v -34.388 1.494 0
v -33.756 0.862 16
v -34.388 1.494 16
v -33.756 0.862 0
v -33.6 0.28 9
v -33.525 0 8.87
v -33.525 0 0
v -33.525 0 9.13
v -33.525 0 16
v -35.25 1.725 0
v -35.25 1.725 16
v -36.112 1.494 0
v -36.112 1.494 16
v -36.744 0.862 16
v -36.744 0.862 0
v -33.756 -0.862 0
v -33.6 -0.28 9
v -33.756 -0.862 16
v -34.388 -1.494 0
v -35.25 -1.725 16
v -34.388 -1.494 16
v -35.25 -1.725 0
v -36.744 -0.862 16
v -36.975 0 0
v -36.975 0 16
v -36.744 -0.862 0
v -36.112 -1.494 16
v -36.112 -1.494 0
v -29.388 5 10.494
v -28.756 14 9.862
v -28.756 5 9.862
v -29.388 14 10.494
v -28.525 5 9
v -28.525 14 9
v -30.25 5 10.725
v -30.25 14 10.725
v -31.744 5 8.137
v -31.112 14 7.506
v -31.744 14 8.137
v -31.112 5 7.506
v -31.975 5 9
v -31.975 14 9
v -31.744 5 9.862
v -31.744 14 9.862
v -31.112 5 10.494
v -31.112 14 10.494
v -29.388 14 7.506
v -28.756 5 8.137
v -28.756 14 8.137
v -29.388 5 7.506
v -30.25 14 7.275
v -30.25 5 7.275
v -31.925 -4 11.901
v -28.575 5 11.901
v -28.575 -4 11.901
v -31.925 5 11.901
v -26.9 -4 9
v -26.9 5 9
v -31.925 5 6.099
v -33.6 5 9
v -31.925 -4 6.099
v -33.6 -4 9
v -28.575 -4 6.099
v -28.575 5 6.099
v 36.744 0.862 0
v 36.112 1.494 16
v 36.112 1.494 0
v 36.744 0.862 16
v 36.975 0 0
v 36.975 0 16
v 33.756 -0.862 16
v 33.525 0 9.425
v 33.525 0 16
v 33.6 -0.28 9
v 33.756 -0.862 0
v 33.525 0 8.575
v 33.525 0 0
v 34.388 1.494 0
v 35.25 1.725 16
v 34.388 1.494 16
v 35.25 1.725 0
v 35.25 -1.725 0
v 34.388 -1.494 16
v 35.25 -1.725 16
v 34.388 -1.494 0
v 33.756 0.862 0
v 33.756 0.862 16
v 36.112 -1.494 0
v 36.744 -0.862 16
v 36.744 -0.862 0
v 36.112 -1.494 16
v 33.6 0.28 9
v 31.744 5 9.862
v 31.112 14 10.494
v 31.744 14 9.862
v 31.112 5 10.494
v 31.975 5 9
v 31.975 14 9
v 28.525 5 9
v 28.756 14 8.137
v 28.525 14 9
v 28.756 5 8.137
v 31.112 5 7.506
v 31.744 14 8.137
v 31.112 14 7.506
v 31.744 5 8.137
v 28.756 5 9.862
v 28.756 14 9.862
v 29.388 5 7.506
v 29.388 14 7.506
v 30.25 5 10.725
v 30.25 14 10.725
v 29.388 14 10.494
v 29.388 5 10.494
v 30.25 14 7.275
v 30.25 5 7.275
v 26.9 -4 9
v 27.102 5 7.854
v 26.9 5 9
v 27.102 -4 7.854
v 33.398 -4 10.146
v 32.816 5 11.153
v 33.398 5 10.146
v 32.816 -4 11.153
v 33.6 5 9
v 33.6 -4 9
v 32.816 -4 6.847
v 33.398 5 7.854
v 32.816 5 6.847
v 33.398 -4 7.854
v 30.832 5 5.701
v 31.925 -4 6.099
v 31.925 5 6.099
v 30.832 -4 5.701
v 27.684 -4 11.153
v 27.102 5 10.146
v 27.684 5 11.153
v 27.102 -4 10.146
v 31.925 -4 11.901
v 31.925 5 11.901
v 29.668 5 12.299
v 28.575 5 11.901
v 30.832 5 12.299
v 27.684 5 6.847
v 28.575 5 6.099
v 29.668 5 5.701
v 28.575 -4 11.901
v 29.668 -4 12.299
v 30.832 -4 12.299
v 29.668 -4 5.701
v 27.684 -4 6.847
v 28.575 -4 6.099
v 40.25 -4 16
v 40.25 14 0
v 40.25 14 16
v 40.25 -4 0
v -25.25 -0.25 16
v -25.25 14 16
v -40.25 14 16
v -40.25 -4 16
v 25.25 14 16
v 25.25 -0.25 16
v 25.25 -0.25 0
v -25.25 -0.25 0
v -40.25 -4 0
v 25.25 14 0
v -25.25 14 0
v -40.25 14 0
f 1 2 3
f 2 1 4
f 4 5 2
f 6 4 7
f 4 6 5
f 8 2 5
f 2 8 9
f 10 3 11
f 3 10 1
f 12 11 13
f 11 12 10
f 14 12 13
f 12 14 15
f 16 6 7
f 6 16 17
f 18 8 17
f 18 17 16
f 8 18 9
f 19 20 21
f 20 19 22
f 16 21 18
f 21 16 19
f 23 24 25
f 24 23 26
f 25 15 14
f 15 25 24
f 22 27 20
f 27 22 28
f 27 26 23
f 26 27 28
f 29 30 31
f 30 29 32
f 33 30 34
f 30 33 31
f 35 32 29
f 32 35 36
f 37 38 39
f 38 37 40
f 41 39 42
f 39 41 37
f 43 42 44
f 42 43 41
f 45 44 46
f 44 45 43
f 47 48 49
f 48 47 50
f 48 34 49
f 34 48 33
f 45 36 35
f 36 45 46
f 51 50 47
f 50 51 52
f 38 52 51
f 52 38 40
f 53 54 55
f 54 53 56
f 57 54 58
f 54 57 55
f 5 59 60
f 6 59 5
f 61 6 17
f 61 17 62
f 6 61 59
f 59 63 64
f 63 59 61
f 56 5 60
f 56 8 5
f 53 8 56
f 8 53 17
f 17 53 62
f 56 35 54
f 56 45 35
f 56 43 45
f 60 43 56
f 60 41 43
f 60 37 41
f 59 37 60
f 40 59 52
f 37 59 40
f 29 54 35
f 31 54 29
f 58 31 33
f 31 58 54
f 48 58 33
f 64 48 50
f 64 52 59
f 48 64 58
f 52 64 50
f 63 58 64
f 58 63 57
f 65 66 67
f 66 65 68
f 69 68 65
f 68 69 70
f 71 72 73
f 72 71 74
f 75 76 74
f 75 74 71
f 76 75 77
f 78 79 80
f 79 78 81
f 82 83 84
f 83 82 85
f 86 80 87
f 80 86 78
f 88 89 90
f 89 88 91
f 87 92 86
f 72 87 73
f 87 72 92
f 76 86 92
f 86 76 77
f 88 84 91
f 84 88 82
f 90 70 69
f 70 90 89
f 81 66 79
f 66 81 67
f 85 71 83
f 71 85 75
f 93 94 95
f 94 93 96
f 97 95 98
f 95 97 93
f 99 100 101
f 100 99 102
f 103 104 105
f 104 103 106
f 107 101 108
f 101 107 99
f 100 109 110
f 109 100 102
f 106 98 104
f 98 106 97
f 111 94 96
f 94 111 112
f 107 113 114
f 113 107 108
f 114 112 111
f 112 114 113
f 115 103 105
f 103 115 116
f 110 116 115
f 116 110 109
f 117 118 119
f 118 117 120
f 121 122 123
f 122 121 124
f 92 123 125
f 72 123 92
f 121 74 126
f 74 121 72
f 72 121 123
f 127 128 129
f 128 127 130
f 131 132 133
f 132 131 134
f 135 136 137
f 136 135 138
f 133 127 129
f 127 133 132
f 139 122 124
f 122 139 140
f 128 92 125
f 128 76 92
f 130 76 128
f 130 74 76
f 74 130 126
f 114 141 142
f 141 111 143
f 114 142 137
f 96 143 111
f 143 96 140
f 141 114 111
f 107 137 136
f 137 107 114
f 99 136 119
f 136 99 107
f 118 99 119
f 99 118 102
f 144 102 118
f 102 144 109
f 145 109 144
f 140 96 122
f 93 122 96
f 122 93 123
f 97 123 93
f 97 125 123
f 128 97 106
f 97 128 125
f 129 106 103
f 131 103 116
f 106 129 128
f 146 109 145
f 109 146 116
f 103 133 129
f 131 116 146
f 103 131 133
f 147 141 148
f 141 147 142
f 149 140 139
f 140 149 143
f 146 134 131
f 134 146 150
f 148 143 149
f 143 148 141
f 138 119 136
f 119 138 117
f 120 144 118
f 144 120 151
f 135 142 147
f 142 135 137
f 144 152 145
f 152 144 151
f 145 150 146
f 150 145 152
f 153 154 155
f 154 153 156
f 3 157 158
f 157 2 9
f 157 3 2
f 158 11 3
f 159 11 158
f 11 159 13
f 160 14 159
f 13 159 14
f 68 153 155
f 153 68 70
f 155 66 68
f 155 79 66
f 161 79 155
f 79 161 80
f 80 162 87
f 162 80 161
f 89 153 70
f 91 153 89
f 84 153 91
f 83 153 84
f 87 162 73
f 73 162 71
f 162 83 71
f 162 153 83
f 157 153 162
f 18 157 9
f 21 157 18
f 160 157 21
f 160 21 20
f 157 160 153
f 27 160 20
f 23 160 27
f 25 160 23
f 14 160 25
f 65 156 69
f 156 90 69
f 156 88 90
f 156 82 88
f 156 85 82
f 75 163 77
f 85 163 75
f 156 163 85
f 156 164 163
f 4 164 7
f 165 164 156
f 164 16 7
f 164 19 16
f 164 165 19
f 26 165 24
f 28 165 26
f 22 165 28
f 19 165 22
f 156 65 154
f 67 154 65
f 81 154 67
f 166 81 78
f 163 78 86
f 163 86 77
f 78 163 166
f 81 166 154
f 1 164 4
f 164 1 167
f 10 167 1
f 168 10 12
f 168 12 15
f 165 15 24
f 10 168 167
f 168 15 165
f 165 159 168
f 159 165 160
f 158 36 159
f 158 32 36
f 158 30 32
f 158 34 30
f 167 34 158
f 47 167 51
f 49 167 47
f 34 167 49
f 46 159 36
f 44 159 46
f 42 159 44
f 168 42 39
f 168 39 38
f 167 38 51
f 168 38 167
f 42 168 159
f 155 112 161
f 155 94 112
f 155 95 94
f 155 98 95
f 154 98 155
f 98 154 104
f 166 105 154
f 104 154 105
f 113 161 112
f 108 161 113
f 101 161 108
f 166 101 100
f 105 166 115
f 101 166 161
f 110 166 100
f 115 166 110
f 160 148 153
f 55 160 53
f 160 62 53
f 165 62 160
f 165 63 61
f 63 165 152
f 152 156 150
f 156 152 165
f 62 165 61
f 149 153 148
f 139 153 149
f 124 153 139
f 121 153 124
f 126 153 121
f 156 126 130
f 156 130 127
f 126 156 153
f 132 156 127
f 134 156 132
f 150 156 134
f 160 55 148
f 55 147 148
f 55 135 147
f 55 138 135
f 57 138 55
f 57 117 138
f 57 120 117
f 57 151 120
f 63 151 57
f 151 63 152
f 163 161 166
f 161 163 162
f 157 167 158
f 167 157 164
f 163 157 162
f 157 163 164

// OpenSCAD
// file: ../include/configuration.scad
// Increase this if your slicer or printer make holes too tight.
extra_radius = 0.1;

// OD = outside diameter, corner to corner.
m3_nut_od = 6.1;
m3_nut_radius = m3_nut_od/2 + 0.2 + extra_radius;
m3_washer_radius = 3.5 + extra_radius;

// Major diameter of metric 3mm thread.
m3_major = 2.85;
m3_radius = m3_major/2 + extra_radius;
m3_wide_radius = m3_major/2 + extra_radius + 0.2;

// NEMA17 stepper motors.
motor_shaft_diameter = 5;
motor_shaft_radius = motor_shaft_diameter/2 + extra_radius;

// Frame brackets. M3x8mm screws work best with 3.6 mm brackets.
thickness = 3.6;

// OpenBeam or Misumi. Currently only 15x15 mm, but there is a plan
// to make models more parametric and allow 20x20 mm in the future.
extrusion = 15;

// Placement for the NEMA17 stepper motors.
motor_offset = 44;
motor_length = 47;
// main file
include <../include/configuration.scad>;

space = 15;  // Between horizontal OpenBeam pieces.

power_supply_height = 30.5;
power_supply_width = 50.5;

module power_supply() {
  difference() {
    translate([0, 5, 8])
      cube([power_supply_width+30, 18, 16],
        center=true);
    // Power supply body.
    translate([0, 7.5+space/2, 0])
      cube([power_supply_width, power_supply_height, 100], center=true);
    // Screw holes.
    for (x = [-1, 1]) {
      translate([x*(power_supply_width/2+10), 0, 9])
        cylinder(r=m3_wide_radius, h=40, center=true, $fn=12);
      translate([x*(power_supply_width/2+5), 20, 9]) rotate([90, 0, 0])
        cylinder(r=m3_wide_radius, h=40, center=true, $fn=12);
      translate([x*(power_supply_width/2+5), 5, 9]) rotate([90, 0, 0])
        cylinder(r=m3_nut_radius, h=40, $fn=12+x*6);
    }
  }
}

power_supply();
% translate([0, space+15, 0]) rotate([0, 0, 180]) power_supply();
